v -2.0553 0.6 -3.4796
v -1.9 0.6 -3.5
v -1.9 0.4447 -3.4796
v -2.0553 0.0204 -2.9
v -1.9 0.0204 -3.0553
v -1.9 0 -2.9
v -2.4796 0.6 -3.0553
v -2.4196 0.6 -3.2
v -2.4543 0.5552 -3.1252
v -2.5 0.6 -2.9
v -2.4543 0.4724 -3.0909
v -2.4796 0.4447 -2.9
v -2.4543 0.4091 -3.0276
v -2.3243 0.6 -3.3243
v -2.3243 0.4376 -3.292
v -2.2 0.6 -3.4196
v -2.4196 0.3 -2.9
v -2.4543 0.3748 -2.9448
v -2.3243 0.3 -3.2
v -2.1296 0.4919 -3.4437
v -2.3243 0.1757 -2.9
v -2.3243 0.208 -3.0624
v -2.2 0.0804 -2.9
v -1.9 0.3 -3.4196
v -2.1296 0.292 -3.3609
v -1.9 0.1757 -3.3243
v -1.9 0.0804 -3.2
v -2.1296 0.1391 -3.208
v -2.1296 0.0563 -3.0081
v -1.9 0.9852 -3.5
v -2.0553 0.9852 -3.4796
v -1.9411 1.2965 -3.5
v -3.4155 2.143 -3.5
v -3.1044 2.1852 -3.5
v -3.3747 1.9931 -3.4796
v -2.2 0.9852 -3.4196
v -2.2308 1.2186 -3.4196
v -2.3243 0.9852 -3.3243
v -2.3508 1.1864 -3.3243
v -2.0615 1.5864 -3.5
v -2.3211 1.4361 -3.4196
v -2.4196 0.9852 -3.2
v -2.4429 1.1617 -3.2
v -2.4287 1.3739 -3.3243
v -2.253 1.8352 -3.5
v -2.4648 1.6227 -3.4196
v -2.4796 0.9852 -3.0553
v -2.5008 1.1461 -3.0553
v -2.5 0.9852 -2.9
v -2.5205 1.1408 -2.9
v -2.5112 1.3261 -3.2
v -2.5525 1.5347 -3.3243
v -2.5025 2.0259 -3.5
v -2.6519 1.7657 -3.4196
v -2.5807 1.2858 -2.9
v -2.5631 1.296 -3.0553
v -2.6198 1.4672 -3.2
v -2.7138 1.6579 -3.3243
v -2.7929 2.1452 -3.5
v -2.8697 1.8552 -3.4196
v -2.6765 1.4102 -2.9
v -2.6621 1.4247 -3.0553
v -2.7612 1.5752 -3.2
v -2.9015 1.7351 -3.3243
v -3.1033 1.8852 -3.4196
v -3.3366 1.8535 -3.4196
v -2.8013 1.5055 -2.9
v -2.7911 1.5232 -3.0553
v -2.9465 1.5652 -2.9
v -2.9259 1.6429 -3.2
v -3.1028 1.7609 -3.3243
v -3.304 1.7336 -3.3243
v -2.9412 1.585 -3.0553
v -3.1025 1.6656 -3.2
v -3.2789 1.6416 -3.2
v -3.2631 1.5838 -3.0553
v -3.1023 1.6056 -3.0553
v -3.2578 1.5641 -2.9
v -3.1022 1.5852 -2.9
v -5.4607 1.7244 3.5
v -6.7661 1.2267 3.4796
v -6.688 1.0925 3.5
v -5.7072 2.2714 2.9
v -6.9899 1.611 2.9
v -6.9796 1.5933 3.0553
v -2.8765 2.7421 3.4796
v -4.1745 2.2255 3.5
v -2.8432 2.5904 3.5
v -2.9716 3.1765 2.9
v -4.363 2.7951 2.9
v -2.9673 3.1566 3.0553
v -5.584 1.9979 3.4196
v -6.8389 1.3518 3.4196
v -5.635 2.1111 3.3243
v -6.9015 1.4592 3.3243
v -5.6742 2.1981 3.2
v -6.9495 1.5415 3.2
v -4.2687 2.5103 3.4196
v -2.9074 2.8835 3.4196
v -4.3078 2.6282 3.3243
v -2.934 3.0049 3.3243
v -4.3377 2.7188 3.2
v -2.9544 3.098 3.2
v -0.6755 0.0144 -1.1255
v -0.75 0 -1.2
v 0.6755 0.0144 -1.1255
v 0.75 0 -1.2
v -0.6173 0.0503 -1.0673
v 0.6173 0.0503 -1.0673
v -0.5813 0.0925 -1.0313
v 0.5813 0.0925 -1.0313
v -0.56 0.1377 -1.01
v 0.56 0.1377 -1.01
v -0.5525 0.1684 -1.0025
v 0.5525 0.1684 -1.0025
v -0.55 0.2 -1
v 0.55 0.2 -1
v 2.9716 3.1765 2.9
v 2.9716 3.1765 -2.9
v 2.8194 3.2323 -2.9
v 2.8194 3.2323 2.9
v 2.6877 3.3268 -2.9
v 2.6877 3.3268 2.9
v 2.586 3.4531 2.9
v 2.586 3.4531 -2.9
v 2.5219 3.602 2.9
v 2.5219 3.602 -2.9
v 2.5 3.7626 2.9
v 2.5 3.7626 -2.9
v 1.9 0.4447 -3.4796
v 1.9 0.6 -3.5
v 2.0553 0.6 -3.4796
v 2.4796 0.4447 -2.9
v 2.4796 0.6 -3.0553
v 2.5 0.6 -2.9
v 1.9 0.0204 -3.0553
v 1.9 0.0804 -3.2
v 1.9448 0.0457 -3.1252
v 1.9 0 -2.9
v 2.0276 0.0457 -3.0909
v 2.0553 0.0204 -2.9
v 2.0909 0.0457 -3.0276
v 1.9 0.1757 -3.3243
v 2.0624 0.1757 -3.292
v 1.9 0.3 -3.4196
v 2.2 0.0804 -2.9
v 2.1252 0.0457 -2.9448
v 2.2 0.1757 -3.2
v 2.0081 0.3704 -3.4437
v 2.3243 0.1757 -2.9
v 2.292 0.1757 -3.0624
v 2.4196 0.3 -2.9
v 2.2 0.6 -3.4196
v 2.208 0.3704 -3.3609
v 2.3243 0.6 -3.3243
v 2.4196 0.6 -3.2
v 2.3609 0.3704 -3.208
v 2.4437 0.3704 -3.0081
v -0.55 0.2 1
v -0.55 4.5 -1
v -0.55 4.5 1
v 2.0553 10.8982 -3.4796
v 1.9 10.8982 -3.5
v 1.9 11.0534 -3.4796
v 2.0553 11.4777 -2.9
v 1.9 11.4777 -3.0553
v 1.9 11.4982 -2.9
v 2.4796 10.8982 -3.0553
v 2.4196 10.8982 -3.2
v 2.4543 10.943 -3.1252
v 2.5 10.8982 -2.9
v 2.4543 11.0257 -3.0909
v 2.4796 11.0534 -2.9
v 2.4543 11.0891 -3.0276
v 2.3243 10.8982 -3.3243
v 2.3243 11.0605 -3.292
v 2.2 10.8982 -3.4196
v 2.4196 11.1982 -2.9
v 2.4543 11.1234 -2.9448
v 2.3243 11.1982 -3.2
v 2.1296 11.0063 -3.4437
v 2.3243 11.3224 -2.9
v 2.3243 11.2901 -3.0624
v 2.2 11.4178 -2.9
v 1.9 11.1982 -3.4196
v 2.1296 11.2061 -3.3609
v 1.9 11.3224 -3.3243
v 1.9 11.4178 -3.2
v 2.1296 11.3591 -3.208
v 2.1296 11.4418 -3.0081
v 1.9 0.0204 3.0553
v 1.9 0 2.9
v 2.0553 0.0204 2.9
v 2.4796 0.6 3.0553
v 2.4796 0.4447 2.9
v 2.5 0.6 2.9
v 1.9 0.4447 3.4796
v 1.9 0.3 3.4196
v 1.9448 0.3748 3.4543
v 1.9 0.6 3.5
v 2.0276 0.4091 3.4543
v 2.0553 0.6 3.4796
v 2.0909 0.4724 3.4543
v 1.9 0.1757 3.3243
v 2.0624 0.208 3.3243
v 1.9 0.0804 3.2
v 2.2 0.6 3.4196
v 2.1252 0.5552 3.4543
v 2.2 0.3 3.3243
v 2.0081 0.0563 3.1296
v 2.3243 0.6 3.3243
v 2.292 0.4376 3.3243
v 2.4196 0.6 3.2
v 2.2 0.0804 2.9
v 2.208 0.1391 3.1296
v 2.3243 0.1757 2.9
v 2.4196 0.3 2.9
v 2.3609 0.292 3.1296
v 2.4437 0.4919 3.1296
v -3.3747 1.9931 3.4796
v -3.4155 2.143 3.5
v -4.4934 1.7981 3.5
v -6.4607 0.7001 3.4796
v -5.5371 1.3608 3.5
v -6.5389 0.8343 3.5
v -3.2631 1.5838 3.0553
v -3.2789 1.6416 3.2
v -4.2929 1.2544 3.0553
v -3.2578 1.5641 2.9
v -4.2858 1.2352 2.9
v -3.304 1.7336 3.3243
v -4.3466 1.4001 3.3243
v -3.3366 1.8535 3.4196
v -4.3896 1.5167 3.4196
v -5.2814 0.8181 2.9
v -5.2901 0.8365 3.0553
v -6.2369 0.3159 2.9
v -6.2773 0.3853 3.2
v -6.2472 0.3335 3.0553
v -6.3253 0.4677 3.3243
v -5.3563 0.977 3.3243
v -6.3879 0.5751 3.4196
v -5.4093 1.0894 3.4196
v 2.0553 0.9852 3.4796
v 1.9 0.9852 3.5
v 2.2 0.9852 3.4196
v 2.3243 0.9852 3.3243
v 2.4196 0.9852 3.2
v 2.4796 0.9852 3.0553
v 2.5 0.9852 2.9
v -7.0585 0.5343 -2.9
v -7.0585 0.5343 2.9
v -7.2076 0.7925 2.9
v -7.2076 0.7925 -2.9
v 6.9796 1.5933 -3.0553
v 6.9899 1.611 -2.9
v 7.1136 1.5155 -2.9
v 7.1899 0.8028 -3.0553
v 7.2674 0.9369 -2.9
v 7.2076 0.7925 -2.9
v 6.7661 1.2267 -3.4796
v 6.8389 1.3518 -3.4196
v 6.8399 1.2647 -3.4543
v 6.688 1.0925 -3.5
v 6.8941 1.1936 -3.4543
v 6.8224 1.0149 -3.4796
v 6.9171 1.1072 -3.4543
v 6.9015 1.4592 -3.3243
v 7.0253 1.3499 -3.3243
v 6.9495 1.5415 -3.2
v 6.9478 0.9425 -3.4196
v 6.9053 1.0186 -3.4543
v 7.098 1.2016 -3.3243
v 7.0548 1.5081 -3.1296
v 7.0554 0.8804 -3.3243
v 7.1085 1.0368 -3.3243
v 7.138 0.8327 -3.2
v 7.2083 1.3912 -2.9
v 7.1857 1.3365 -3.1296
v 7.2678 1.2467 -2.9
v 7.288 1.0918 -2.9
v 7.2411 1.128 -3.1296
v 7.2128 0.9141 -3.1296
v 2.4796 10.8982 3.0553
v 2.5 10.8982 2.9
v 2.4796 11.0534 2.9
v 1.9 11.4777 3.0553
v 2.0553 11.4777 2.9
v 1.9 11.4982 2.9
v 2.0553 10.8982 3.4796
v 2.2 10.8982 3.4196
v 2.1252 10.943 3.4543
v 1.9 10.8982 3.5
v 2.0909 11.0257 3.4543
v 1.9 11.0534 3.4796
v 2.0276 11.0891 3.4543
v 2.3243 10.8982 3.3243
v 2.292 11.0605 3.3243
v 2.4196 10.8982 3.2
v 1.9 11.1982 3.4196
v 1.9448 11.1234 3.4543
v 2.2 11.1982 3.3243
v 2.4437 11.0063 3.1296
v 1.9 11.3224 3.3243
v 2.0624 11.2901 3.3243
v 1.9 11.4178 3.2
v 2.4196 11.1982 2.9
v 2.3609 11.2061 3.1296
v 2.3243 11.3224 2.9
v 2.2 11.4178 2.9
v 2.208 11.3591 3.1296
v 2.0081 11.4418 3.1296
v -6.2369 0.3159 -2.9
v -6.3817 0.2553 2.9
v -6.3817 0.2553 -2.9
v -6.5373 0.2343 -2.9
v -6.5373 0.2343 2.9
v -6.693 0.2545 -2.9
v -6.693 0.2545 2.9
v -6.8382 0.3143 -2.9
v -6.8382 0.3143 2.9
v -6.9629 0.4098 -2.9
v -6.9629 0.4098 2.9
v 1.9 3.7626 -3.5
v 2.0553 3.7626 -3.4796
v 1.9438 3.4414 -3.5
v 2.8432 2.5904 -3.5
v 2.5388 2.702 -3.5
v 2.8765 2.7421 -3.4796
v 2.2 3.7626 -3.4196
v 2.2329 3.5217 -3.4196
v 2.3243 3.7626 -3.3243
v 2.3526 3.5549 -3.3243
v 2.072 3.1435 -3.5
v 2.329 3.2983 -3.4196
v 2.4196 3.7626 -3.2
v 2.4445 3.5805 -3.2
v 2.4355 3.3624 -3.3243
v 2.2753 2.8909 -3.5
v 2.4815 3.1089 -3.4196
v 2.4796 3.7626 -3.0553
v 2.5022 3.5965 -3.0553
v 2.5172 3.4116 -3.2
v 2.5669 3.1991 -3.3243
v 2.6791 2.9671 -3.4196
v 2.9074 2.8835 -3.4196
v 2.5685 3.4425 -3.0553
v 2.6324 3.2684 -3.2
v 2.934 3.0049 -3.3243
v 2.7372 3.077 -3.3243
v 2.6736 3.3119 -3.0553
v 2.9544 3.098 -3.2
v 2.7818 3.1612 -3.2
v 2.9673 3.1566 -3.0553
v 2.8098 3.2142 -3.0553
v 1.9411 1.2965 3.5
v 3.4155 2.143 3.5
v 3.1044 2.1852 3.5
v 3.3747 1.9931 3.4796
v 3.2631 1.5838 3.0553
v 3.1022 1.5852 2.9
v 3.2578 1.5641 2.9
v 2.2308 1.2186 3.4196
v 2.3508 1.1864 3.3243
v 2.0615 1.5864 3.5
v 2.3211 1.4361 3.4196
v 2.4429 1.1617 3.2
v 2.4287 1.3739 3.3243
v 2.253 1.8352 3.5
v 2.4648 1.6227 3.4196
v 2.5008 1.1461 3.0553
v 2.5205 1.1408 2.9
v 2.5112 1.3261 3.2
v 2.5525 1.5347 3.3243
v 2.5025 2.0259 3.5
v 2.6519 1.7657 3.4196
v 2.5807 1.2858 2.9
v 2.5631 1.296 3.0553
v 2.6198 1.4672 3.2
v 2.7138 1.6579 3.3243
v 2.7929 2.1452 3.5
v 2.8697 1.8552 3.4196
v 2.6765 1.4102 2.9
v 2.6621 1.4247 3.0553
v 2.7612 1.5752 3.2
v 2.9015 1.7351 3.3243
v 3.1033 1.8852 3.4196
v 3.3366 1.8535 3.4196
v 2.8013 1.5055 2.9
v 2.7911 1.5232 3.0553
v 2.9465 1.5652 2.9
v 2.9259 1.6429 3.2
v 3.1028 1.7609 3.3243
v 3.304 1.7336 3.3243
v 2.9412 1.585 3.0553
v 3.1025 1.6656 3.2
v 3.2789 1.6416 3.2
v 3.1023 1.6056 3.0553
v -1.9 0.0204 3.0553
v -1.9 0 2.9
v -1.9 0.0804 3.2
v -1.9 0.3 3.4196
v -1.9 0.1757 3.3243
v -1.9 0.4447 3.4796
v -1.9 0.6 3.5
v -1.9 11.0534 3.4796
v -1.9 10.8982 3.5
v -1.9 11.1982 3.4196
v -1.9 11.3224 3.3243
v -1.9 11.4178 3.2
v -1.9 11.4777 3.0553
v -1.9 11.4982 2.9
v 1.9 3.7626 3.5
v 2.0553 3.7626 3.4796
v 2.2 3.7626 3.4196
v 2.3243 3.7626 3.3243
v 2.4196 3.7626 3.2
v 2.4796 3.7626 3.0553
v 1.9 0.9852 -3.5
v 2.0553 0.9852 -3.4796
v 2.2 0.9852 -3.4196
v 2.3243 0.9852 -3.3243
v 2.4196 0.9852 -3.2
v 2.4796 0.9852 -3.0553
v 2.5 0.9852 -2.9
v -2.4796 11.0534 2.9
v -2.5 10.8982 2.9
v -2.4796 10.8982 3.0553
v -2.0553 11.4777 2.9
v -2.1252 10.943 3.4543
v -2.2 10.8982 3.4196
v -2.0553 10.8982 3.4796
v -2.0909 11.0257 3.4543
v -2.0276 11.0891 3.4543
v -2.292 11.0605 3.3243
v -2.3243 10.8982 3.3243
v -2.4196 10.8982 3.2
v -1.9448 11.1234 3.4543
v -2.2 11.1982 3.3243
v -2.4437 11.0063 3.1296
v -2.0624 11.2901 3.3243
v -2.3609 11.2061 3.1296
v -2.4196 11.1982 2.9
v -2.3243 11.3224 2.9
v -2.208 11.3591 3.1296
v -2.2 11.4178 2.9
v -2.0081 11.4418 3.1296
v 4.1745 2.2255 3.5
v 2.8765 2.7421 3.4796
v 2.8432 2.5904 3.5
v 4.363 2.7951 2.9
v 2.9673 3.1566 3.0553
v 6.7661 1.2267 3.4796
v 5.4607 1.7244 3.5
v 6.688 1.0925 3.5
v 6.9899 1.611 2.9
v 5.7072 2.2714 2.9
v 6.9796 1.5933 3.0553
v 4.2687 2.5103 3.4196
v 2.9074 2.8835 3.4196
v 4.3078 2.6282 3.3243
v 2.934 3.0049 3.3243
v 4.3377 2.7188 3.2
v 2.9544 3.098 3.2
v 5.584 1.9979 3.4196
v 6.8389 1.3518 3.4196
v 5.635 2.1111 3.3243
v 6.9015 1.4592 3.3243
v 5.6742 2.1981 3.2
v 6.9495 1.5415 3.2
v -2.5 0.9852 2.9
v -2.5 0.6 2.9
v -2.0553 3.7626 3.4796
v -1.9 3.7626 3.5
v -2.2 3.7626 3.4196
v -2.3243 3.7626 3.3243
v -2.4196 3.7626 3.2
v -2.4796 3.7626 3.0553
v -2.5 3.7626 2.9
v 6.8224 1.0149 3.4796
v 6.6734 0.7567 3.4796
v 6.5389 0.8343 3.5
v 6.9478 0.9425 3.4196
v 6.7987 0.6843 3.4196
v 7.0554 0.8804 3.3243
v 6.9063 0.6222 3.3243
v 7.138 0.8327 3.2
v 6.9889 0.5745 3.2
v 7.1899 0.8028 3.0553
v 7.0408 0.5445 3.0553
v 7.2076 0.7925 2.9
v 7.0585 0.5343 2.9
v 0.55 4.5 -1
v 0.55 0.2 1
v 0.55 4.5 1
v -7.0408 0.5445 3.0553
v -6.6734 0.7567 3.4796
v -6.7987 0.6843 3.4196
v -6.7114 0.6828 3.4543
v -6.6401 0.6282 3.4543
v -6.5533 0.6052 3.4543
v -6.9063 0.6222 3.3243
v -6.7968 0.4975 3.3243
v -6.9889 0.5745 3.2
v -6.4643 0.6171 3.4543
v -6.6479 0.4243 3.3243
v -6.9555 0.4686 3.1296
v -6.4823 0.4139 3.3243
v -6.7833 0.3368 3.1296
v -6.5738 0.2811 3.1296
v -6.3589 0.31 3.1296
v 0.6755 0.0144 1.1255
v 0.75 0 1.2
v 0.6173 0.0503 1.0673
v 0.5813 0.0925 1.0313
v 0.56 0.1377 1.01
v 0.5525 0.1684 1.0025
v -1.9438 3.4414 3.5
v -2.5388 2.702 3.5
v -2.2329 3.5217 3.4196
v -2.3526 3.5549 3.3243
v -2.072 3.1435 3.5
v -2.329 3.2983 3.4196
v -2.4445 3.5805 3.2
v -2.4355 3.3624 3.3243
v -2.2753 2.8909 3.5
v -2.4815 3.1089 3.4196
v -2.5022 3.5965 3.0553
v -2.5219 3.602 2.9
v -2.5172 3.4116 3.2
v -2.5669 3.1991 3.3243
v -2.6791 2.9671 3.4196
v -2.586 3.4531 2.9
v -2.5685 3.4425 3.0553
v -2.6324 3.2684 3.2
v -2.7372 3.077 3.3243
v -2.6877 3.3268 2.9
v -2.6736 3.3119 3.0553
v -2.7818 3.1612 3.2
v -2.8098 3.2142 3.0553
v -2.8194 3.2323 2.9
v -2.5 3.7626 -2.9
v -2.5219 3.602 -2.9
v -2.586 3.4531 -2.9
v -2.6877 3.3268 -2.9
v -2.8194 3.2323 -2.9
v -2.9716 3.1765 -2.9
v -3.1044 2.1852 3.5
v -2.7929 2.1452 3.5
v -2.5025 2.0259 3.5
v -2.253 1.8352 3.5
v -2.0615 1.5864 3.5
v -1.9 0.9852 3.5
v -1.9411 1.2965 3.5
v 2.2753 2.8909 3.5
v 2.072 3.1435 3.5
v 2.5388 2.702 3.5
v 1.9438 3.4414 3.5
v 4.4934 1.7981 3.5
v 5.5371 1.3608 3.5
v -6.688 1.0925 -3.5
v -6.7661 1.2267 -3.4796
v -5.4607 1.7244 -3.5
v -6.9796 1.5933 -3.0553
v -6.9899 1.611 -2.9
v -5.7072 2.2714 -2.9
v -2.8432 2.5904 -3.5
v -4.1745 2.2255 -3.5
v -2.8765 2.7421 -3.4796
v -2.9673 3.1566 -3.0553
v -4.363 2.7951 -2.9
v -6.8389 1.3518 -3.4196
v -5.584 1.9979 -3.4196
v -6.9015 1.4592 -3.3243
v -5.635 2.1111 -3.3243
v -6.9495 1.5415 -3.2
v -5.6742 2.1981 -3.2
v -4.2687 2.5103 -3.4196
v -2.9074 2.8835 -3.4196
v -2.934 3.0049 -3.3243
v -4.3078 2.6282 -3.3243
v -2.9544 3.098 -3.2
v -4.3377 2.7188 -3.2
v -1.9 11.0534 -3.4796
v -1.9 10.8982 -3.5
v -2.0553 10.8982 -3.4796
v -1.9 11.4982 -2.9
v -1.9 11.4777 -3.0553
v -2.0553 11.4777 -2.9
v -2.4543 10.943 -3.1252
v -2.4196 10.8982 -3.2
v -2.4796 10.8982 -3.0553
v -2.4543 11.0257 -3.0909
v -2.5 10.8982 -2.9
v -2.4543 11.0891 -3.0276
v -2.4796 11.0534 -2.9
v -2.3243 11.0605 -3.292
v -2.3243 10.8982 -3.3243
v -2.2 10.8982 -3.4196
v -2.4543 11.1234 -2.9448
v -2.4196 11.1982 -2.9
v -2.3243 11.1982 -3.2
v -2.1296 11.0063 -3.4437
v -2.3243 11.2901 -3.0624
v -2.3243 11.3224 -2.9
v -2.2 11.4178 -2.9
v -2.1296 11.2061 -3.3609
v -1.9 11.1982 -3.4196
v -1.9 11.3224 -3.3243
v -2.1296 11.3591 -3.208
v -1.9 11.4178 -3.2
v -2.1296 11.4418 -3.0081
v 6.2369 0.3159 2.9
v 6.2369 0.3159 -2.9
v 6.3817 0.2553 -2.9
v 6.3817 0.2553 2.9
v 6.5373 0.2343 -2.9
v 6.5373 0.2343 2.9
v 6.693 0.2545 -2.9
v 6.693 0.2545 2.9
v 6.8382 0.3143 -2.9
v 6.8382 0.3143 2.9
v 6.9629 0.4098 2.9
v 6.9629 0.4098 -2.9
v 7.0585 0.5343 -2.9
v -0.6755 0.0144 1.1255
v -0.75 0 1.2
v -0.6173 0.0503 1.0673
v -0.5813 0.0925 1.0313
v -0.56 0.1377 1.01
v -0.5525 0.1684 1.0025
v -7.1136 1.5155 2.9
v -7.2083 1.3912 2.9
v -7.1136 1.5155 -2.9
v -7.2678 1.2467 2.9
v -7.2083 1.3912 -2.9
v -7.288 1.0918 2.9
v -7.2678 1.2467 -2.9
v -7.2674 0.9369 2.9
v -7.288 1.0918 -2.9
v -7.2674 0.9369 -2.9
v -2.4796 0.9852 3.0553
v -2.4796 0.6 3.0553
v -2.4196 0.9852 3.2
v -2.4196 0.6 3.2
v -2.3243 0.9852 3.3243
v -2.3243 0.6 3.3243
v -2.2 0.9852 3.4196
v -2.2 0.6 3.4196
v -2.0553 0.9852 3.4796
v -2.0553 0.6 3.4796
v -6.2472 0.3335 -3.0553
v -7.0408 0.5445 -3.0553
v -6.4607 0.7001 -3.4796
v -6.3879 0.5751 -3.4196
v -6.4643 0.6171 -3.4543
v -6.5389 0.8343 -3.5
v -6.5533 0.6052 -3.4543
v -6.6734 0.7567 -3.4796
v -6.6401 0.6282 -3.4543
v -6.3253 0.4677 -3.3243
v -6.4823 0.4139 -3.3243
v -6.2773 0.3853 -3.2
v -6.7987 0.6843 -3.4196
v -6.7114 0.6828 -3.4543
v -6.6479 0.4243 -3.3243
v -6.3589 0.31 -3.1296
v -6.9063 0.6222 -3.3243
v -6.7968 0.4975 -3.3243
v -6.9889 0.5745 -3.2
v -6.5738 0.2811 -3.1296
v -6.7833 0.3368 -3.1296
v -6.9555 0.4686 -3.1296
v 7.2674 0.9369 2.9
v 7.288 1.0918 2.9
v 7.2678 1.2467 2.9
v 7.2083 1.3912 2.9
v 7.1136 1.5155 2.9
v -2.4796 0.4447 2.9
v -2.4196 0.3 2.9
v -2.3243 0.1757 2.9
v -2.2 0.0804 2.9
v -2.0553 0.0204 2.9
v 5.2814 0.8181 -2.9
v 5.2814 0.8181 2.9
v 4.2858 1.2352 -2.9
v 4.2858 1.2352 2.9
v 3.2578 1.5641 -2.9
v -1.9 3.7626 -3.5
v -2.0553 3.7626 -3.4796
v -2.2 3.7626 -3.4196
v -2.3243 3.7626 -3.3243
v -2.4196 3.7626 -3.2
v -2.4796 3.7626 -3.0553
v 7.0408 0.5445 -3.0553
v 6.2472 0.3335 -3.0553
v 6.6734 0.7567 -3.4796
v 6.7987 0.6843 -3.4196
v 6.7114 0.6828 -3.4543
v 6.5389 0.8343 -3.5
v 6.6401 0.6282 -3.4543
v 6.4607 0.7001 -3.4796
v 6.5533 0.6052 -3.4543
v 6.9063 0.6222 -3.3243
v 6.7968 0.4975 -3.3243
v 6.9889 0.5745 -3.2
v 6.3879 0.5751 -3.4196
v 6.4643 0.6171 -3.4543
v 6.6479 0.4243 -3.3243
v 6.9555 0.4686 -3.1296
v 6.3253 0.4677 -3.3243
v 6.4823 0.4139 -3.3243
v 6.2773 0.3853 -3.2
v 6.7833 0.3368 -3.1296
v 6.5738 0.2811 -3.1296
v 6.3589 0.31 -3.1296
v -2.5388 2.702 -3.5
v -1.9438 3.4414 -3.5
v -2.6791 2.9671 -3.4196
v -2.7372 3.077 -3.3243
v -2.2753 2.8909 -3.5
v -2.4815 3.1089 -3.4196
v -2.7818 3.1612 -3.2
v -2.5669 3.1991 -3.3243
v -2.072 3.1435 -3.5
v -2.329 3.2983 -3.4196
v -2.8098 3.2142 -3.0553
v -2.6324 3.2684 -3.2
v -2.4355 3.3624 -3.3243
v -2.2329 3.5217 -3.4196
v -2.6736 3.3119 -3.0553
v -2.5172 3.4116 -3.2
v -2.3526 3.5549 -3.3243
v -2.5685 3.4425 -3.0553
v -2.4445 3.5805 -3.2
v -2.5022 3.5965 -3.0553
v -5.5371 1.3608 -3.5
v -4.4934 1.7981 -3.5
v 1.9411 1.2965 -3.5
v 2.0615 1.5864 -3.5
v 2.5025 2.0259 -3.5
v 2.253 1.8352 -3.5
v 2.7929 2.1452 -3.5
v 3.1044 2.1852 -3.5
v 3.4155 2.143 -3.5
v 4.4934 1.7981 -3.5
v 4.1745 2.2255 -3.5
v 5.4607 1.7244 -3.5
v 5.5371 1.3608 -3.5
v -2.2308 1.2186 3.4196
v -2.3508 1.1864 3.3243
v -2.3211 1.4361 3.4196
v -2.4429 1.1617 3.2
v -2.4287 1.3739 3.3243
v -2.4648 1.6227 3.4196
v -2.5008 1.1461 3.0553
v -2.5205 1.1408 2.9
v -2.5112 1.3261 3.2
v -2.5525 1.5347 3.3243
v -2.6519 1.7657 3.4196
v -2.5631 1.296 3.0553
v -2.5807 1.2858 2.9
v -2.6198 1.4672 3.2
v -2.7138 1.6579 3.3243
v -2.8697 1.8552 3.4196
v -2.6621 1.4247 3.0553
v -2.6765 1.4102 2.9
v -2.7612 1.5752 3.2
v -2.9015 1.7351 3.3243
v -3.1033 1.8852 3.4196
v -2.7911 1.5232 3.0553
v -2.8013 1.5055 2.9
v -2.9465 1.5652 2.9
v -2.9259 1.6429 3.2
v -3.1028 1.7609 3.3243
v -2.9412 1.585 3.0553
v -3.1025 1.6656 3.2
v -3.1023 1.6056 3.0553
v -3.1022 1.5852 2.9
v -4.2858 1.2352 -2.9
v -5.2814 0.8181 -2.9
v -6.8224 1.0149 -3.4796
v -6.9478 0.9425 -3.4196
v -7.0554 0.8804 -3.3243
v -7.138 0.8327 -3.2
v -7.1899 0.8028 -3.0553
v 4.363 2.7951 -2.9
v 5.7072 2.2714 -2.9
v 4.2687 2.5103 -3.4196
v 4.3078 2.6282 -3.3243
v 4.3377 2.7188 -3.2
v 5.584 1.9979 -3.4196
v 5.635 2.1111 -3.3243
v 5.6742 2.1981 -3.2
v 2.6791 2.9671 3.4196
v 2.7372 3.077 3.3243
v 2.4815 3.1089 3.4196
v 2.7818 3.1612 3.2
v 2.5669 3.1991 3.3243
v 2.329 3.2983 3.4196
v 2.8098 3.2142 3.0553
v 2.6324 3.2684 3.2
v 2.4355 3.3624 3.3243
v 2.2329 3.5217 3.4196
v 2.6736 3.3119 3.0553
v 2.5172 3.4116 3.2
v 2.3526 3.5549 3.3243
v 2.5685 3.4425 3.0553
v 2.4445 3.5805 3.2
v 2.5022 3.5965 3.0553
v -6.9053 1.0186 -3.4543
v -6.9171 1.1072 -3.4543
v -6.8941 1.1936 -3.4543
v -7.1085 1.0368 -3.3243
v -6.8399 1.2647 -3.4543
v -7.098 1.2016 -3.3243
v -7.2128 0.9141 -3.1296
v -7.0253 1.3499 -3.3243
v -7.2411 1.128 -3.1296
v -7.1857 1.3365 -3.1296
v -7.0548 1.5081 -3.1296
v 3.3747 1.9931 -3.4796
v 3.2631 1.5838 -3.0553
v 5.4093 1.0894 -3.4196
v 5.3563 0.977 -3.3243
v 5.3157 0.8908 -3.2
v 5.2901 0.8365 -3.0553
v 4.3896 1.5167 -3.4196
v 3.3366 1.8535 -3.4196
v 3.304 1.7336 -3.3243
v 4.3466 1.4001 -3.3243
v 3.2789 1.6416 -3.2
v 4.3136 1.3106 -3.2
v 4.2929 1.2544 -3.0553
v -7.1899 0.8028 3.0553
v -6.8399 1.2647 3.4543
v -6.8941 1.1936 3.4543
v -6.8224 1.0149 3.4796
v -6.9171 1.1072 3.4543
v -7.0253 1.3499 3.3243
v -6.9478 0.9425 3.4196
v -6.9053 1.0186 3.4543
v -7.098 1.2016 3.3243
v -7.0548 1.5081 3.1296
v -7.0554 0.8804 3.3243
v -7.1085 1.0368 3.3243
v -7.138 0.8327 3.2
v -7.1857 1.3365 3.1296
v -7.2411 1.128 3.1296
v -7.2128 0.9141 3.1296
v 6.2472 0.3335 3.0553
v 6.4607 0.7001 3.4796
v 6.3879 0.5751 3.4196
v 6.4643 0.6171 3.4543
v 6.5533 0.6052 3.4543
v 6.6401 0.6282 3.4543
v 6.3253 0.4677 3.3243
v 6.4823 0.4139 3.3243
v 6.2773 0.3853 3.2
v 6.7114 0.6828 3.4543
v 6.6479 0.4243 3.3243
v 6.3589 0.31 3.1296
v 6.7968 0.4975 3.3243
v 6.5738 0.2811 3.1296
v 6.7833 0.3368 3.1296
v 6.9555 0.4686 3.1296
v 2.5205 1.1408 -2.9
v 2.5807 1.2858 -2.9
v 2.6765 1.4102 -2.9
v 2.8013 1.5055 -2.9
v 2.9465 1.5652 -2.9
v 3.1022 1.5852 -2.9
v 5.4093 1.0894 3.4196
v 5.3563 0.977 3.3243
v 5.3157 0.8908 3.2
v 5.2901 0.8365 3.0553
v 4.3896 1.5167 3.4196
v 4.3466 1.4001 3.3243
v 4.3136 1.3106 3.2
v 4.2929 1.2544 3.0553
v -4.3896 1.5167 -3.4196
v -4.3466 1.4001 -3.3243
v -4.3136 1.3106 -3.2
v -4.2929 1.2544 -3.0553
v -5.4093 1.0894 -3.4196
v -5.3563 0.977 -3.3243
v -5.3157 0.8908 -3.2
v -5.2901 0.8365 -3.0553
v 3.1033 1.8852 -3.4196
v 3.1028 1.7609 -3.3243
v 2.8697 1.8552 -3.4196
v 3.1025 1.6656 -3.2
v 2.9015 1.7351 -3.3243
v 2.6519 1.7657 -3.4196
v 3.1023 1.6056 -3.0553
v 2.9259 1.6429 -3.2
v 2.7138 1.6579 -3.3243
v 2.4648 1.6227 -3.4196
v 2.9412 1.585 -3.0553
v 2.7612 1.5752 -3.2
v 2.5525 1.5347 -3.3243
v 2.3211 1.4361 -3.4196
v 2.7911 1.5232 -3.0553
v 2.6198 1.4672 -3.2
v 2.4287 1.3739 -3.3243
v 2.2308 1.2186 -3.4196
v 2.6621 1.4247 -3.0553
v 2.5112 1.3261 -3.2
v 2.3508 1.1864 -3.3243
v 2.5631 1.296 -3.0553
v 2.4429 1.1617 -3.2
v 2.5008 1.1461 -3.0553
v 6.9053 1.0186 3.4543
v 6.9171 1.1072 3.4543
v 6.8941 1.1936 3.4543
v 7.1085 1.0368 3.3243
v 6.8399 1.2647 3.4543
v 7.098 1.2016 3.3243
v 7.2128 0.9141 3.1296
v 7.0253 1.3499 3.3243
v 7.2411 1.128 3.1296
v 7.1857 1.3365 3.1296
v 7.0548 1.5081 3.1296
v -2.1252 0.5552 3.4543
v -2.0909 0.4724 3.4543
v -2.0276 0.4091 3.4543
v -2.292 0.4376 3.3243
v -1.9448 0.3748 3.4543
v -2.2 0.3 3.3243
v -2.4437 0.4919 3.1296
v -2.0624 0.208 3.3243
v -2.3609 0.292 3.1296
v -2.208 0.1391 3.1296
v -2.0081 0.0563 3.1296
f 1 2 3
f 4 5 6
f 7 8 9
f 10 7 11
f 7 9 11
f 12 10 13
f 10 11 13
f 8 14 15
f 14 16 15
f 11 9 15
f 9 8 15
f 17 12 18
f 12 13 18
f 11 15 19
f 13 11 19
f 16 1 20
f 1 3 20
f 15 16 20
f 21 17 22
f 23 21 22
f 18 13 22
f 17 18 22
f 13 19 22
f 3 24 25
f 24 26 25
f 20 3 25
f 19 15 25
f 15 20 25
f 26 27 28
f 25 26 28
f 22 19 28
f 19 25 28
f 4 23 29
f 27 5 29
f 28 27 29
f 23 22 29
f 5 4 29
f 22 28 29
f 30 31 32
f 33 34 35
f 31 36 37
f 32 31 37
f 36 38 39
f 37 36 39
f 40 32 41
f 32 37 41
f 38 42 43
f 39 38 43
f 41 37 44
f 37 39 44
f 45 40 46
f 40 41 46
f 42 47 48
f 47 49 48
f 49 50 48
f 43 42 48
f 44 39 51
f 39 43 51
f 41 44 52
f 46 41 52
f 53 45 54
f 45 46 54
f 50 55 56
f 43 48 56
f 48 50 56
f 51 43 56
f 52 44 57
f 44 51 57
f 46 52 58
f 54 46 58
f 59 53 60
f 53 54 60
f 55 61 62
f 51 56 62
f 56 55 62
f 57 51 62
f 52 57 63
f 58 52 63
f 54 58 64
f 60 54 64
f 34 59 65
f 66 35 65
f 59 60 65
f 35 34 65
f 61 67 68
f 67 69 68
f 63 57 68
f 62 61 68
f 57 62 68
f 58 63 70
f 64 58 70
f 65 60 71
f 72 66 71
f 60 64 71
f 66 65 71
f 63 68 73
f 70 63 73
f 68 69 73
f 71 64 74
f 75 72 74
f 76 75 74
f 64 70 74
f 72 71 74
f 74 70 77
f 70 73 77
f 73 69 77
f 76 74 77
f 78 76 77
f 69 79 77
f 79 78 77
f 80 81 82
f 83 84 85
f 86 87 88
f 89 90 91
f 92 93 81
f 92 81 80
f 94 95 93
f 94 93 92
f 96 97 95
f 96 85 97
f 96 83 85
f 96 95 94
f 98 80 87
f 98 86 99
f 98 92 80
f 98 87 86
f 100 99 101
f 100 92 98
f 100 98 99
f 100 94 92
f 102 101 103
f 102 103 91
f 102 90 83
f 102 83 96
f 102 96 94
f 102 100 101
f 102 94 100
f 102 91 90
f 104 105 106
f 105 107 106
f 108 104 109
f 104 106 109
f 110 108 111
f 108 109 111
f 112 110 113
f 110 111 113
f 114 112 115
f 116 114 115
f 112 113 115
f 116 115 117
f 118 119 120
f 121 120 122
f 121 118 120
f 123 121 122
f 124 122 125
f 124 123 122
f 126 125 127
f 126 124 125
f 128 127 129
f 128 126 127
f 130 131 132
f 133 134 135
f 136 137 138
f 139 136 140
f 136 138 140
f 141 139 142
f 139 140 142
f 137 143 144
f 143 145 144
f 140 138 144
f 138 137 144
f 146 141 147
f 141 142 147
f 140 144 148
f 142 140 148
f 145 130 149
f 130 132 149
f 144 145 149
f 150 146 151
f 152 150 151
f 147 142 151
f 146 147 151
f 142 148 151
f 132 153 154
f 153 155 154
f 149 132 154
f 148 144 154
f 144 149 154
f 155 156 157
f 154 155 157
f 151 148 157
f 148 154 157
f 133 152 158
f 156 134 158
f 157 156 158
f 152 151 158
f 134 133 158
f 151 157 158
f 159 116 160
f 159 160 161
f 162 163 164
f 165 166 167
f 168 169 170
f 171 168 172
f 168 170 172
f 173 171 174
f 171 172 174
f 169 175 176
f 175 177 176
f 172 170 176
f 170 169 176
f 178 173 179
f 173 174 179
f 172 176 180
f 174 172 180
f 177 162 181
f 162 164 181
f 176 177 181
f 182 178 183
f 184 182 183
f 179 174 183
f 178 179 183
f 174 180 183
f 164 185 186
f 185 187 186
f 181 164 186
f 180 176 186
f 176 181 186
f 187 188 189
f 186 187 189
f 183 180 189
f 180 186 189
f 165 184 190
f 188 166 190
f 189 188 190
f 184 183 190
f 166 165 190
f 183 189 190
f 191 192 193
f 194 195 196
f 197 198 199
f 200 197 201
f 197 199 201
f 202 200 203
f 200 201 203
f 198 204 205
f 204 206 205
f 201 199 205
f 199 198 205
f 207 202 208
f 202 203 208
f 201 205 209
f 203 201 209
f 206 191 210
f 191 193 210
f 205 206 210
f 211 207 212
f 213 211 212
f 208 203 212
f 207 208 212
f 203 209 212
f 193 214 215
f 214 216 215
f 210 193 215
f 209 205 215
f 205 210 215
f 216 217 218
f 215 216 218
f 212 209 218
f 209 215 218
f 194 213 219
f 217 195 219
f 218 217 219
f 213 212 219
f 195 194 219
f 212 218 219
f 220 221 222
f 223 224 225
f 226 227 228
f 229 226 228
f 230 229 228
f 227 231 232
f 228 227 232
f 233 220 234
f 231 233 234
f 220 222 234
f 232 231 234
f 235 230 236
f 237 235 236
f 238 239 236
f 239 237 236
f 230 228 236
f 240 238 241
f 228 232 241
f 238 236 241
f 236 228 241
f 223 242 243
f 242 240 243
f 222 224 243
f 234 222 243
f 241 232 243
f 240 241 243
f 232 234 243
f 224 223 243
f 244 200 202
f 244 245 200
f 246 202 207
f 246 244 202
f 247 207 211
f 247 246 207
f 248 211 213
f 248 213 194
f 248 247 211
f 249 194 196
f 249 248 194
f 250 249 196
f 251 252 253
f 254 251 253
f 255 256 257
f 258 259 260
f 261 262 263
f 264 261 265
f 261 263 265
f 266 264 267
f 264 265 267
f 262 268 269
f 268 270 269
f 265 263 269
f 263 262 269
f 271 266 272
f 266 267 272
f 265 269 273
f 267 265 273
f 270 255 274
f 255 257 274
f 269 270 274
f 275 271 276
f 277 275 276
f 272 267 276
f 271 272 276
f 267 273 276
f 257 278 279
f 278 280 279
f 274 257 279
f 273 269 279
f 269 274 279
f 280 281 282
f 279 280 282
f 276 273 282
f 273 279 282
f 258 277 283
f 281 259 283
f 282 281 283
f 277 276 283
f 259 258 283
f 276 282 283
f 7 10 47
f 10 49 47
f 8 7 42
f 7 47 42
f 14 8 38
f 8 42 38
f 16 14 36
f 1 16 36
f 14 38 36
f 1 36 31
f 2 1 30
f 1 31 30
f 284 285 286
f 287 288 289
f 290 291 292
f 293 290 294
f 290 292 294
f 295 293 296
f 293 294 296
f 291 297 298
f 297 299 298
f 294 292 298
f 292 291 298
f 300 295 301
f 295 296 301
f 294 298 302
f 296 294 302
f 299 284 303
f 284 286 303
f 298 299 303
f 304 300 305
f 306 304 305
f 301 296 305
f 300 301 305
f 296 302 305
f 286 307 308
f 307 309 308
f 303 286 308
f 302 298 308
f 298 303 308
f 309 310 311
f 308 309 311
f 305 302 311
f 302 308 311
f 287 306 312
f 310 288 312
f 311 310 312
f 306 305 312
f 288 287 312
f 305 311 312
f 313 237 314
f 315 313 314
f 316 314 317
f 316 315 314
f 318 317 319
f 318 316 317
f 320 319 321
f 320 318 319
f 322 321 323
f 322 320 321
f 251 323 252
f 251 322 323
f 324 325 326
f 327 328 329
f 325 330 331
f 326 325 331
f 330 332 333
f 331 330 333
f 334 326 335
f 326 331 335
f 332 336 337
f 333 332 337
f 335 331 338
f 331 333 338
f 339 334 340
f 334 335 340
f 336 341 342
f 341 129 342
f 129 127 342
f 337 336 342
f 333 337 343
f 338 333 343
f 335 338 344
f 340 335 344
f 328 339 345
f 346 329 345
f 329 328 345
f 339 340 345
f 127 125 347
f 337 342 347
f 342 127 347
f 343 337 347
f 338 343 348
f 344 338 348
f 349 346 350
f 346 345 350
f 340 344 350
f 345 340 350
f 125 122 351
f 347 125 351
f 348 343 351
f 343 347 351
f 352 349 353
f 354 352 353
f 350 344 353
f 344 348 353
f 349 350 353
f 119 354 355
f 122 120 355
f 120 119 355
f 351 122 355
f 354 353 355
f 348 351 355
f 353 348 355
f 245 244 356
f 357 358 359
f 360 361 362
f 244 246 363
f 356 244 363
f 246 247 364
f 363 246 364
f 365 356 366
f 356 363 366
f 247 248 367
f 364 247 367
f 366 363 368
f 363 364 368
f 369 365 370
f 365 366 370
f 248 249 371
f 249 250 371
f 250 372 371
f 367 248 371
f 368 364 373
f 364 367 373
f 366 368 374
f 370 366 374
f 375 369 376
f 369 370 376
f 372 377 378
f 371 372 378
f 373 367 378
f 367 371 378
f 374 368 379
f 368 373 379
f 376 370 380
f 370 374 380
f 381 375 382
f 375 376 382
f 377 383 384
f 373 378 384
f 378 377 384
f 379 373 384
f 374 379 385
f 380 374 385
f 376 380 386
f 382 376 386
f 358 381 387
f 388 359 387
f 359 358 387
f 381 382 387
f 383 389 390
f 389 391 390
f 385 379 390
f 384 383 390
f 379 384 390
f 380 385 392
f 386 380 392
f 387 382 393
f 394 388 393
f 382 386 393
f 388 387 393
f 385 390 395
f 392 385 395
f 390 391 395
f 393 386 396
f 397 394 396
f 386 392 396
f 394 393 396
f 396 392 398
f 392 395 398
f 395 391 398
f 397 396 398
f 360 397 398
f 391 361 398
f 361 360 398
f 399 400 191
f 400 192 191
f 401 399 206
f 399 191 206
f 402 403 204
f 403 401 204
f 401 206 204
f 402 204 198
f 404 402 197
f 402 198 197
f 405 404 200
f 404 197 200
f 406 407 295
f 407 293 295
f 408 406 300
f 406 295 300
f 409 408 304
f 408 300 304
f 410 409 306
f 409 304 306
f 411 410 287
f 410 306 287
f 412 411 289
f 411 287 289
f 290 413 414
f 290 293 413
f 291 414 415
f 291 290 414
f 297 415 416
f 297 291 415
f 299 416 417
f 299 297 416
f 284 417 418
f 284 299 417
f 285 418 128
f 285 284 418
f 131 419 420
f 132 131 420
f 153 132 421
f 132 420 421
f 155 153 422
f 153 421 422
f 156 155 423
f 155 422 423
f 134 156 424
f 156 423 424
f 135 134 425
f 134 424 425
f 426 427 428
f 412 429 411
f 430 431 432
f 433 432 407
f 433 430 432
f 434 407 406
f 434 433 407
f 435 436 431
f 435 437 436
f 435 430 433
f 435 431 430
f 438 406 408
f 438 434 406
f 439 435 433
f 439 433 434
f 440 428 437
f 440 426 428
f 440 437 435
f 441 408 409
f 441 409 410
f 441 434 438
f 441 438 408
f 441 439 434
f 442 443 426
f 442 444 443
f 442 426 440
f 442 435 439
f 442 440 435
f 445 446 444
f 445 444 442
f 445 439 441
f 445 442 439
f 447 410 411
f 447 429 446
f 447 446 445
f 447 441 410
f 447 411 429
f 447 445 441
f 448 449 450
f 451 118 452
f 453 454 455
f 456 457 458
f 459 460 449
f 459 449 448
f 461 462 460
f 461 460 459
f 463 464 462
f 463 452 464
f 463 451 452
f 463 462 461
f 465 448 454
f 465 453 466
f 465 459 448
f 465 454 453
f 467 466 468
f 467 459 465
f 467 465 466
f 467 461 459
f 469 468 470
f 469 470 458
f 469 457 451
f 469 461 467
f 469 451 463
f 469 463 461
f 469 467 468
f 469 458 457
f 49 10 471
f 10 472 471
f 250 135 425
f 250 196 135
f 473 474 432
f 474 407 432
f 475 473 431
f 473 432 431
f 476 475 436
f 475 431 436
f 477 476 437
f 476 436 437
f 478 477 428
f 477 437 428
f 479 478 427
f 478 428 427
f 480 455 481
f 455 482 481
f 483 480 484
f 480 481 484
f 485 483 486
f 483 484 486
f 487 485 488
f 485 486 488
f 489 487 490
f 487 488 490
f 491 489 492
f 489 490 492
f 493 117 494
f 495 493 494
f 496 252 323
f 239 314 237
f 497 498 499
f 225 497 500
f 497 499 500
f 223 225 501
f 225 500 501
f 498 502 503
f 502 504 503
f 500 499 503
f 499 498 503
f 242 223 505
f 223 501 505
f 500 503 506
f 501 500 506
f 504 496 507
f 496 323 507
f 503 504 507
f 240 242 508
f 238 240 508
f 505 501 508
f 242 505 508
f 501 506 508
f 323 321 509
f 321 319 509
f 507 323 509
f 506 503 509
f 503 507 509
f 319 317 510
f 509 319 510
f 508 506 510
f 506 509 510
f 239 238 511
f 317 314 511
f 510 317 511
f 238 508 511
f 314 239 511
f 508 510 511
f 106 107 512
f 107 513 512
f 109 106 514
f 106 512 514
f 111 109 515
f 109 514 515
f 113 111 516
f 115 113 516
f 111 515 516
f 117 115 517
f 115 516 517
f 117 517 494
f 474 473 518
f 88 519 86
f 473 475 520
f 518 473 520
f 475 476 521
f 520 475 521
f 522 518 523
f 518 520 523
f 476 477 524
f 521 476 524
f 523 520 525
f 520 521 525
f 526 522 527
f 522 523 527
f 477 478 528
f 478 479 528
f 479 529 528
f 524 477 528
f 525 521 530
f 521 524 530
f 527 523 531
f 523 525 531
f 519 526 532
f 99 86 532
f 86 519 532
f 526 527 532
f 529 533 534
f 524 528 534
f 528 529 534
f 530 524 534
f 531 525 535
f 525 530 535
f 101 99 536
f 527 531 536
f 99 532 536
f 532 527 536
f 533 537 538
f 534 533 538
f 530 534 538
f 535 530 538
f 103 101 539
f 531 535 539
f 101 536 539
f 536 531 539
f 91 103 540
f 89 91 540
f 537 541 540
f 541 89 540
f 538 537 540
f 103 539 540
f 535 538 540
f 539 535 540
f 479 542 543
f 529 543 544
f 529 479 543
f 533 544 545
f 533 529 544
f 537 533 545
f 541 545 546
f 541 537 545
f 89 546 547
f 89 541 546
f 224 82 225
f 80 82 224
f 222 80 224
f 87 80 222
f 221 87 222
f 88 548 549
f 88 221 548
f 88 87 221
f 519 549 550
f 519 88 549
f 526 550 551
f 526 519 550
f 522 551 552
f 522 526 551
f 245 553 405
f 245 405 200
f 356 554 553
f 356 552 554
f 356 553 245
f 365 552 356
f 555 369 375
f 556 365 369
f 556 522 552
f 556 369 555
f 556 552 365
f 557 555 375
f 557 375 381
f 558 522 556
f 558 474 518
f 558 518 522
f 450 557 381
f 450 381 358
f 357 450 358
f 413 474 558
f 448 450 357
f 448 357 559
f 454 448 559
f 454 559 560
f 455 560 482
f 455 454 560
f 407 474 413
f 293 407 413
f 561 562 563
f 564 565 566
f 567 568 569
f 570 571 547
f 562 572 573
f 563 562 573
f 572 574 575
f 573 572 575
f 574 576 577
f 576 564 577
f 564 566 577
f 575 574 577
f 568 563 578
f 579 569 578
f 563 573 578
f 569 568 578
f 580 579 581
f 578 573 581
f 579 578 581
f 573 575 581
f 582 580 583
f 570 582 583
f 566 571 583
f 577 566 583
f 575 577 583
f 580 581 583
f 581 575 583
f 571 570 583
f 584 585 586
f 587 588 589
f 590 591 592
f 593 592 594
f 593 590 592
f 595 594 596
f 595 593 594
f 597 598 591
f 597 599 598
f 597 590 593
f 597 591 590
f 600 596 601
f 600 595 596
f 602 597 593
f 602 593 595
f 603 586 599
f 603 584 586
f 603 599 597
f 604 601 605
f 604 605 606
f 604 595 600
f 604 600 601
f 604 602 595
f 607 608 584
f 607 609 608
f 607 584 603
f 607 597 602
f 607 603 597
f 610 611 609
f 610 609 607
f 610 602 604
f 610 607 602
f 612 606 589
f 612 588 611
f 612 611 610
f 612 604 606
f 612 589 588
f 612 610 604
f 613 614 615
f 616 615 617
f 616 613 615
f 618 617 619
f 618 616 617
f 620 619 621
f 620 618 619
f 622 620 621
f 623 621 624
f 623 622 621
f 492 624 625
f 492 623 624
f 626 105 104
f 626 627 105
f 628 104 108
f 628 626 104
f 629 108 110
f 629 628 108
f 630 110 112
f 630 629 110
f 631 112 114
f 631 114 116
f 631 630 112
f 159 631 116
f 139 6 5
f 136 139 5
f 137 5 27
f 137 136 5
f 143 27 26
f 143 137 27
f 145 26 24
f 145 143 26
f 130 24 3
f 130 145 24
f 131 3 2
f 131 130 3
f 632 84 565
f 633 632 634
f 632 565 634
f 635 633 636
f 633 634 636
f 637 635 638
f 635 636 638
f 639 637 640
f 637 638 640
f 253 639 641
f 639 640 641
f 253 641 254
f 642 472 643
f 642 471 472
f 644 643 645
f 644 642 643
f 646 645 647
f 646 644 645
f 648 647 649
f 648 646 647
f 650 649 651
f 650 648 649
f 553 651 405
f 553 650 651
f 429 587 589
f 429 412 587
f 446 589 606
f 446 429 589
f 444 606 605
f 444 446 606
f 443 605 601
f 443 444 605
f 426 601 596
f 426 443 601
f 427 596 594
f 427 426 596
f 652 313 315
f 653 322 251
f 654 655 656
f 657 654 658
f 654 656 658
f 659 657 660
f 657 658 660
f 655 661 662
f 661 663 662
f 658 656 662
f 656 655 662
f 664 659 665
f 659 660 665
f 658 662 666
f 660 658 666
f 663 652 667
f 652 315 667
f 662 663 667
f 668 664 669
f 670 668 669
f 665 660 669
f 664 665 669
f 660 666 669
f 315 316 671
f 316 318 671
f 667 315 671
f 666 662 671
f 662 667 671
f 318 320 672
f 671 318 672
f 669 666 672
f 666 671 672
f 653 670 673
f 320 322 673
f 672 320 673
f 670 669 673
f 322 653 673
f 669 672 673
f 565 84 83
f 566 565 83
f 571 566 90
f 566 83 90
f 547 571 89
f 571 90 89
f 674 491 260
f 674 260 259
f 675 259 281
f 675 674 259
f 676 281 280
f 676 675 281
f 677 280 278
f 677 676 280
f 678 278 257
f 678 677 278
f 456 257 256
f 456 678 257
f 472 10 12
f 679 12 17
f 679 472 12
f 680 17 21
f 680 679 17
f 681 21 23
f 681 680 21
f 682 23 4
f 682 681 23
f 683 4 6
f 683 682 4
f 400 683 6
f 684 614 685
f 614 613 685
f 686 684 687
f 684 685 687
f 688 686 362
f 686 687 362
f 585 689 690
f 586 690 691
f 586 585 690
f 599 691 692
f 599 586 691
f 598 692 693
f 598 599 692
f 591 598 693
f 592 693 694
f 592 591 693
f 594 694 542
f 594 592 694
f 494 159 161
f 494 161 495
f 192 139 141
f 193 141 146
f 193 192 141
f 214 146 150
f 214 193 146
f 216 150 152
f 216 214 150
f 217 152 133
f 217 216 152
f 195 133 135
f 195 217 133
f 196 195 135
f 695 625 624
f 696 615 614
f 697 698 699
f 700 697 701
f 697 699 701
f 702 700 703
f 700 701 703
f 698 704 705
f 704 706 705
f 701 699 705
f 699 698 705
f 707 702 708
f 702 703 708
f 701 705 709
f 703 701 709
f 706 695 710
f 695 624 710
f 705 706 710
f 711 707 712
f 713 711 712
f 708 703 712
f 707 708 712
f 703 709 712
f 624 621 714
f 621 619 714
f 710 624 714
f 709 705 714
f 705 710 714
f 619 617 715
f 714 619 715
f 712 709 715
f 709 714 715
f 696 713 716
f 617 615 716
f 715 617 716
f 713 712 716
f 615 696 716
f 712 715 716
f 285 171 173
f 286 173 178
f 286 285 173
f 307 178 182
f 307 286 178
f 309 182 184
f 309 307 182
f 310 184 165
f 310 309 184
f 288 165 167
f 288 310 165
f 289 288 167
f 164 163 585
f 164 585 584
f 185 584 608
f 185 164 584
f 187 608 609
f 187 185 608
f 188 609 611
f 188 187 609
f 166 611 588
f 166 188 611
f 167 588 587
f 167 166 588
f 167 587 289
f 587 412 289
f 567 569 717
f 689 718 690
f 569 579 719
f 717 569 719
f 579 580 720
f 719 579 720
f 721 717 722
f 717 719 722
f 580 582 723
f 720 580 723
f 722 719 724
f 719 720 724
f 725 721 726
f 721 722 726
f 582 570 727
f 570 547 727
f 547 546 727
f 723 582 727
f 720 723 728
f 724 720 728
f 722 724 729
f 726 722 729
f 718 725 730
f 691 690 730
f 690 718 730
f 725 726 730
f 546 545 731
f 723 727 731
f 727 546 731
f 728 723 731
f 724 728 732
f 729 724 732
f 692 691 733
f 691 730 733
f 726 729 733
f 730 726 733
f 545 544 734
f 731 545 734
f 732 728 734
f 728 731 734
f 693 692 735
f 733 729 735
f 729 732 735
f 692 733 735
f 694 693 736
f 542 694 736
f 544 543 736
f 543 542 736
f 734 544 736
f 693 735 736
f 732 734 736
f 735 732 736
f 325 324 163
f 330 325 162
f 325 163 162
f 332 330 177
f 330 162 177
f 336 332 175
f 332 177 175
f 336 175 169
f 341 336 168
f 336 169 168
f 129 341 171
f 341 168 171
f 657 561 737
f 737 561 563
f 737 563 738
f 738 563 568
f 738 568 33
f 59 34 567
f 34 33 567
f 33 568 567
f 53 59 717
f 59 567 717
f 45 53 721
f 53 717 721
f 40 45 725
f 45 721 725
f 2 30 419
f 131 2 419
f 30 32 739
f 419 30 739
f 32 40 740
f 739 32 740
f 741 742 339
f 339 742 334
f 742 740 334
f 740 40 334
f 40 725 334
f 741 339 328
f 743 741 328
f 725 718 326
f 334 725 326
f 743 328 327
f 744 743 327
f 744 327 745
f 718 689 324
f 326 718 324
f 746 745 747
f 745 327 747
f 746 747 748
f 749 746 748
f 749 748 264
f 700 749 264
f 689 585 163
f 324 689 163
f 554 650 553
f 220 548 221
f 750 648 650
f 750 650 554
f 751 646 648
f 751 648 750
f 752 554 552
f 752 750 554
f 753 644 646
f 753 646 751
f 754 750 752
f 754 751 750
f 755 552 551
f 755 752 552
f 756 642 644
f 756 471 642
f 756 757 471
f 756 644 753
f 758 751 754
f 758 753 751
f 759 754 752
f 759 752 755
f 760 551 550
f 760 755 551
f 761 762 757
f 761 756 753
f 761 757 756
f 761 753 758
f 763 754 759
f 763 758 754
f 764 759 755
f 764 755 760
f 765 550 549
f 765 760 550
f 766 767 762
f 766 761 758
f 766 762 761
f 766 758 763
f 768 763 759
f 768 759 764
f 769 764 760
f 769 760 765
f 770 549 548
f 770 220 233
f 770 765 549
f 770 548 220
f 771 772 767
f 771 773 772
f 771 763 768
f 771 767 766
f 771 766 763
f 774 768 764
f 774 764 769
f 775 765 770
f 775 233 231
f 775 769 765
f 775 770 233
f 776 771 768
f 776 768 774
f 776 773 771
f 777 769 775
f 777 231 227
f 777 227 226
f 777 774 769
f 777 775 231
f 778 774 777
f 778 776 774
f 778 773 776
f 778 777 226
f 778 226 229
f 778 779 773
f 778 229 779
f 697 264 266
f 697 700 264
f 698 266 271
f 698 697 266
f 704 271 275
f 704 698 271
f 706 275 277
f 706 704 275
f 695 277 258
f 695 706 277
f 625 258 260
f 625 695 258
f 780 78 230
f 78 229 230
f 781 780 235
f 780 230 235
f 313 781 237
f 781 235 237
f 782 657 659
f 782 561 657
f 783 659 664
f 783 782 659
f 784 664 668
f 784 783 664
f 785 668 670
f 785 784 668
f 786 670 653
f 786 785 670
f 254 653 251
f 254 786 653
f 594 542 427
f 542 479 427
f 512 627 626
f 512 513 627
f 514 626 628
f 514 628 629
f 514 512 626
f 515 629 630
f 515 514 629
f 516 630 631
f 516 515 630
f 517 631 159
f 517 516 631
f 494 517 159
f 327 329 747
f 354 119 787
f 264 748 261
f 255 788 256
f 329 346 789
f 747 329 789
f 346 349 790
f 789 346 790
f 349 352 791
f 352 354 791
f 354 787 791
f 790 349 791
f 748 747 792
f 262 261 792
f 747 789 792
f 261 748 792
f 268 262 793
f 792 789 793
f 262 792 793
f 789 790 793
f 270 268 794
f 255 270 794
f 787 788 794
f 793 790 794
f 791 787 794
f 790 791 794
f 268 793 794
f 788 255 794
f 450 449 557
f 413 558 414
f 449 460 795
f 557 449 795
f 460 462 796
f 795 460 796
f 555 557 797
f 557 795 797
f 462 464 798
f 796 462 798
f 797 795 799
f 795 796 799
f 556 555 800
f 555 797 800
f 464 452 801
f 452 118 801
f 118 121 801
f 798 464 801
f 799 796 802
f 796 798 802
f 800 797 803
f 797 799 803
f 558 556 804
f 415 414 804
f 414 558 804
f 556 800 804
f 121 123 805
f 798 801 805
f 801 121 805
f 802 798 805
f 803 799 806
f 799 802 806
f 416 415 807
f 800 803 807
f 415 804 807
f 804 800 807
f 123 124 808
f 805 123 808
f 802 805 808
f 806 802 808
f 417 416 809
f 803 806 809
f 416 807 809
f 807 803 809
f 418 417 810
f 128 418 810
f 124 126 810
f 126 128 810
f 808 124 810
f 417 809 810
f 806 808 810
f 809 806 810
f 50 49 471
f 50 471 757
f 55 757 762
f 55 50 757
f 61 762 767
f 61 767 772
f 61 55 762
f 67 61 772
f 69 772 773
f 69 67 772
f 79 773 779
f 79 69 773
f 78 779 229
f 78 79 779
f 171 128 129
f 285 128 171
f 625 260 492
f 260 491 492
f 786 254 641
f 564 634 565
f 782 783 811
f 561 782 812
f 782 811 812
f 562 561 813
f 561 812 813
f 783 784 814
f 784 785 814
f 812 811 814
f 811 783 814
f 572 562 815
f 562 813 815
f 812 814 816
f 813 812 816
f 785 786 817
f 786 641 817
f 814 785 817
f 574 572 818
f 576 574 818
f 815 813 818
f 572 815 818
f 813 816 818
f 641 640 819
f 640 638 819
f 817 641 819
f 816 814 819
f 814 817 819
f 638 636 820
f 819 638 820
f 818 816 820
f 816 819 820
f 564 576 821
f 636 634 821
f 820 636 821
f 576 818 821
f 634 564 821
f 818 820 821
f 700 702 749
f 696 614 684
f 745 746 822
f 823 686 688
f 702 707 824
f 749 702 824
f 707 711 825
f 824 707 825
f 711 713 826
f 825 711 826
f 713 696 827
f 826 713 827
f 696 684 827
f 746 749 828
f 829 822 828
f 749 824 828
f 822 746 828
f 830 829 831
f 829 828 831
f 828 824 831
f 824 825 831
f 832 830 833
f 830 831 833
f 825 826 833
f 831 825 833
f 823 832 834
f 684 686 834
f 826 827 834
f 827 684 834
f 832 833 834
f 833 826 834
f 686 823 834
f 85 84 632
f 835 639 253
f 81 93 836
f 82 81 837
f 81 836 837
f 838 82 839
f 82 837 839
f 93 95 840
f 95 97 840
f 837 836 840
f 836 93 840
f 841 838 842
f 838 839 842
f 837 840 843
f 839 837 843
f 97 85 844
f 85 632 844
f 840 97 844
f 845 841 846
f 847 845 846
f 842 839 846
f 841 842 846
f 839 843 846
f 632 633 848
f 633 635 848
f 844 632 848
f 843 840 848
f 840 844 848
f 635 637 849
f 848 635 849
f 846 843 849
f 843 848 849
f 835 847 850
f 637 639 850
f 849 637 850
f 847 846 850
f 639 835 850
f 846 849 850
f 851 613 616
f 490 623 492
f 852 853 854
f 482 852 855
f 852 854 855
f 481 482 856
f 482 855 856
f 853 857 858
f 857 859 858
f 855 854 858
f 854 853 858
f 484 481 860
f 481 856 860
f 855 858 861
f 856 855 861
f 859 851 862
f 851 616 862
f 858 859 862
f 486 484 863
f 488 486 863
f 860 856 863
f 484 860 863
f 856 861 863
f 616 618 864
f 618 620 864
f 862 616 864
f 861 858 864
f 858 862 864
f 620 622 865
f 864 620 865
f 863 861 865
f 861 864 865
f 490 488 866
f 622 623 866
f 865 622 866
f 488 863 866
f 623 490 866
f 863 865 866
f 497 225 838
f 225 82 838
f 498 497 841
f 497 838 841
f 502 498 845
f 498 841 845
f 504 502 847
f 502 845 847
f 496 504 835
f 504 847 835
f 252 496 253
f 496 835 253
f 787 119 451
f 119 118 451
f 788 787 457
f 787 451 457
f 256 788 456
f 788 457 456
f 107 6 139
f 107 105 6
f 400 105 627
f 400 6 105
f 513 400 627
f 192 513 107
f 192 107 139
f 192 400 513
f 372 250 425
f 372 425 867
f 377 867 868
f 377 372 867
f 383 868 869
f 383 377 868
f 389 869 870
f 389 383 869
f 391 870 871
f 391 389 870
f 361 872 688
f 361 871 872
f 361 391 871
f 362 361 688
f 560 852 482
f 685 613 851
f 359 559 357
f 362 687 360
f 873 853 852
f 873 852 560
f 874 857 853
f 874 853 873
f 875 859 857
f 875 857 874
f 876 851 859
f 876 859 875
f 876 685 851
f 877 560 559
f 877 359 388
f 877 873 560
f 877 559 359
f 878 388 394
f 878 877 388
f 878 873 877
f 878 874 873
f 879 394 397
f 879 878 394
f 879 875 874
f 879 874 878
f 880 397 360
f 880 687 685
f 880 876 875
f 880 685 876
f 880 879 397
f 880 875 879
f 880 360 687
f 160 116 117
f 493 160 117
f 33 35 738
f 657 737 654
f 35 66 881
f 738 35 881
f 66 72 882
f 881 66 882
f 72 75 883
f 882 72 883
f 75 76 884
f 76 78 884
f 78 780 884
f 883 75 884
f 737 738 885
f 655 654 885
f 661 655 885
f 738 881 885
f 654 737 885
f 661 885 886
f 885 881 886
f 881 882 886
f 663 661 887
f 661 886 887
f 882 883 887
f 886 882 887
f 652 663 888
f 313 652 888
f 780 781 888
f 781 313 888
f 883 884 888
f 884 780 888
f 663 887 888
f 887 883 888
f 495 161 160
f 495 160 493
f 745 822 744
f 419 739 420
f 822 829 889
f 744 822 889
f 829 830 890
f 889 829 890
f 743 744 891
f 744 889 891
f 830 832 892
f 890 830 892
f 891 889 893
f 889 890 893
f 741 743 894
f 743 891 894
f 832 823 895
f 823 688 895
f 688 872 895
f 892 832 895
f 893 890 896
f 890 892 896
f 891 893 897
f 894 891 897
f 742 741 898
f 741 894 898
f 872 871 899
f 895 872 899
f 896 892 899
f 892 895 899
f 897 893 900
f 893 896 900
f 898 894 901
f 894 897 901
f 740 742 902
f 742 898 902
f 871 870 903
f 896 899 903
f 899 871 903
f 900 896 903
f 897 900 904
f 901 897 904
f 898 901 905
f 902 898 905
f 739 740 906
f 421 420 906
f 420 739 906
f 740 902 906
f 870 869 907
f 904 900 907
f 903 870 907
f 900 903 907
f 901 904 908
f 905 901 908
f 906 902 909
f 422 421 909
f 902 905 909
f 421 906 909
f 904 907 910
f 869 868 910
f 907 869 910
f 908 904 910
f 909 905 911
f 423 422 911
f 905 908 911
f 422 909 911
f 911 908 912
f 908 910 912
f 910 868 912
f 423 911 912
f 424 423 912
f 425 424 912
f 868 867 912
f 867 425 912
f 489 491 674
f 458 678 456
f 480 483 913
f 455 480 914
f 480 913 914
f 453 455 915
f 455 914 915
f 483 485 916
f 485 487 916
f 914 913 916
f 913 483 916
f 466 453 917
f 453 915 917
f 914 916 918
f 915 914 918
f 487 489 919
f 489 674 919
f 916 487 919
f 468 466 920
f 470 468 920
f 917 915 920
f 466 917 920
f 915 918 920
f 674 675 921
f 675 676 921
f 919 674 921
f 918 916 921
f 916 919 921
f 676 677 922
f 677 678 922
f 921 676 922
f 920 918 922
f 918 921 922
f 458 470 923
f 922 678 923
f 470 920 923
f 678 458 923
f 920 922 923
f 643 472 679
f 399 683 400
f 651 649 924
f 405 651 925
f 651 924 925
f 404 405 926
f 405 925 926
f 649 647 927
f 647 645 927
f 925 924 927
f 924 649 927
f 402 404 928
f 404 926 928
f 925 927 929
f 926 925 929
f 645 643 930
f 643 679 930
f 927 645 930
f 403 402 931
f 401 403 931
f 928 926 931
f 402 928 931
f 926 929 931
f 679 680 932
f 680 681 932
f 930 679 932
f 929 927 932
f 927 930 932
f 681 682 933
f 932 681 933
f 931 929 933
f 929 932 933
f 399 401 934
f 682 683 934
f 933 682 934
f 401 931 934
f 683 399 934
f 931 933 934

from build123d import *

# Parameters (mm, degrees)
EXTRUDE_1_DEPTH     = 3.5
SKETCH_2_W          = 1.1
SKETCH_2_H          = 2
CUT_EXTRUDE_1_DEPTH = 4.5
FILLET_1_R          = 0.6
FILLET_2_R          = 0.2


with BuildPart() as part:
    # 草图1 → 凸台-拉伸1 (new, symmetric)
    with BuildSketch(Plane.XY):
        with BuildLine():
            Line((-2.5, 1.745172786), (-2.5, 0))
            Line((-2.5, 0), (2.5, 0))
            Line((2.5, 0), (2.5, 1.745172786))
            ThreePointArc((2.5, 1.745172786), (4.706594524, 1.071292635), (6.75, 0))
            Line((6.75, 0), (7.5, 1.299038106))
            ThreePointArc((7.5, 1.299038106), (5.096317816, 2.529350551), (2.5, 3.271301055))
            Line((2.5, 3.271301055), (2.5, 11.498155491))
            Line((2.5, 11.498155491), (-2.5, 11.498155491))
            Line((-2.5, 11.498155491), (-2.5, 3.271301055))
            ThreePointArc((-2.5, 3.271301055), (-5.096317816, 2.529350551), (-7.5, 1.299038106))
            Line((-7.5, 1.299038106), (-6.75, 0))
            ThreePointArc((-6.75, 0), (-4.706594524, 1.071292635), (-2.5, 1.745172786))
        make_face()
    extrude(amount=EXTRUDE_1_DEPTH, both=True)

    # 草图2 → 切除-拉伸1 (cut)
    with BuildSketch(Plane.XZ):
        Rectangle(SKETCH_2_W, SKETCH_2_H)
    extrude(amount=-CUT_EXTRUDE_1_DEPTH, mode=Mode.SUBTRACT)

    # 圆角1
    fillet_1_edges = [part.edges().sort_by_distance(p)[0] for p in [
        (2.5, 0, 0),
        (2.5, 1.745172786, 0),
        (-2.5, 1.745172786, 0),
        (-2.5, 0, 0),
        (2.5, 11.498155491, 0),
        (-2.5, 11.498155491, 0),
        (-5.096317816, 2.529350551, -3.5),
        (-4.706594524, 1.071292635, -3.5),
        (-2.5, 0.872586393, -3.5),
        (0, 0, -3.5),
        (2.5, 0.872586393, -3.5),
        (4.706594524, 1.071292635, -3.5),
        (5.096317816, 2.529350551, -3.5),
        (2.5, 7.384728273, -3.5),
        (0, 11.498155491, -3.5),
        (-2.5, 7.384728273, -3.5),
        (0, 11.498155491, 3.5),
        (2.5, 7.384728273, 3.5),
        (5.096317816, 2.529350551, 3.5),
        (4.706594524, 1.071292635, 3.5),
        (2.5, 0.872586393, 3.5),
        (0, 0, 3.5),
        (-2.5, 0.872586393, 3.5),
        (-4.706594524, 1.071292635, 3.5),
        (-5.096317816, 2.529350551, 3.5),
        (-2.5, 7.384728273, 3.5),
        (-7.5, 1.299038106, 0),
        (-7.125, 0.649519053, 3.5),
        (-6.75, 0, 0),
        (-7.125, 0.649519053, -3.5),
        (6.75, 0, 0),
        (7.125, 0.649519053, 3.5),
        (7.5, 1.299038106, 0),
        (7.125, 0.649519053, -3.5),
        (2.5, 3.271301055, 0),
        (-2.5, 3.271301055, 0),
    ]]
    fillet(fillet_1_edges, radius=FILLET_1_R)

    # 圆角2
    fillet_2_edges = [part.edges().sort_by_distance(p)[0] for p in [
        (0.55, 0, 0),
        (-0.55, 0, 0),
        (0, 0, -1),
        (0, 0, 1),
    ]]
    fillet(fillet_2_edges, radius=FILLET_2_R)


solid = part.part
